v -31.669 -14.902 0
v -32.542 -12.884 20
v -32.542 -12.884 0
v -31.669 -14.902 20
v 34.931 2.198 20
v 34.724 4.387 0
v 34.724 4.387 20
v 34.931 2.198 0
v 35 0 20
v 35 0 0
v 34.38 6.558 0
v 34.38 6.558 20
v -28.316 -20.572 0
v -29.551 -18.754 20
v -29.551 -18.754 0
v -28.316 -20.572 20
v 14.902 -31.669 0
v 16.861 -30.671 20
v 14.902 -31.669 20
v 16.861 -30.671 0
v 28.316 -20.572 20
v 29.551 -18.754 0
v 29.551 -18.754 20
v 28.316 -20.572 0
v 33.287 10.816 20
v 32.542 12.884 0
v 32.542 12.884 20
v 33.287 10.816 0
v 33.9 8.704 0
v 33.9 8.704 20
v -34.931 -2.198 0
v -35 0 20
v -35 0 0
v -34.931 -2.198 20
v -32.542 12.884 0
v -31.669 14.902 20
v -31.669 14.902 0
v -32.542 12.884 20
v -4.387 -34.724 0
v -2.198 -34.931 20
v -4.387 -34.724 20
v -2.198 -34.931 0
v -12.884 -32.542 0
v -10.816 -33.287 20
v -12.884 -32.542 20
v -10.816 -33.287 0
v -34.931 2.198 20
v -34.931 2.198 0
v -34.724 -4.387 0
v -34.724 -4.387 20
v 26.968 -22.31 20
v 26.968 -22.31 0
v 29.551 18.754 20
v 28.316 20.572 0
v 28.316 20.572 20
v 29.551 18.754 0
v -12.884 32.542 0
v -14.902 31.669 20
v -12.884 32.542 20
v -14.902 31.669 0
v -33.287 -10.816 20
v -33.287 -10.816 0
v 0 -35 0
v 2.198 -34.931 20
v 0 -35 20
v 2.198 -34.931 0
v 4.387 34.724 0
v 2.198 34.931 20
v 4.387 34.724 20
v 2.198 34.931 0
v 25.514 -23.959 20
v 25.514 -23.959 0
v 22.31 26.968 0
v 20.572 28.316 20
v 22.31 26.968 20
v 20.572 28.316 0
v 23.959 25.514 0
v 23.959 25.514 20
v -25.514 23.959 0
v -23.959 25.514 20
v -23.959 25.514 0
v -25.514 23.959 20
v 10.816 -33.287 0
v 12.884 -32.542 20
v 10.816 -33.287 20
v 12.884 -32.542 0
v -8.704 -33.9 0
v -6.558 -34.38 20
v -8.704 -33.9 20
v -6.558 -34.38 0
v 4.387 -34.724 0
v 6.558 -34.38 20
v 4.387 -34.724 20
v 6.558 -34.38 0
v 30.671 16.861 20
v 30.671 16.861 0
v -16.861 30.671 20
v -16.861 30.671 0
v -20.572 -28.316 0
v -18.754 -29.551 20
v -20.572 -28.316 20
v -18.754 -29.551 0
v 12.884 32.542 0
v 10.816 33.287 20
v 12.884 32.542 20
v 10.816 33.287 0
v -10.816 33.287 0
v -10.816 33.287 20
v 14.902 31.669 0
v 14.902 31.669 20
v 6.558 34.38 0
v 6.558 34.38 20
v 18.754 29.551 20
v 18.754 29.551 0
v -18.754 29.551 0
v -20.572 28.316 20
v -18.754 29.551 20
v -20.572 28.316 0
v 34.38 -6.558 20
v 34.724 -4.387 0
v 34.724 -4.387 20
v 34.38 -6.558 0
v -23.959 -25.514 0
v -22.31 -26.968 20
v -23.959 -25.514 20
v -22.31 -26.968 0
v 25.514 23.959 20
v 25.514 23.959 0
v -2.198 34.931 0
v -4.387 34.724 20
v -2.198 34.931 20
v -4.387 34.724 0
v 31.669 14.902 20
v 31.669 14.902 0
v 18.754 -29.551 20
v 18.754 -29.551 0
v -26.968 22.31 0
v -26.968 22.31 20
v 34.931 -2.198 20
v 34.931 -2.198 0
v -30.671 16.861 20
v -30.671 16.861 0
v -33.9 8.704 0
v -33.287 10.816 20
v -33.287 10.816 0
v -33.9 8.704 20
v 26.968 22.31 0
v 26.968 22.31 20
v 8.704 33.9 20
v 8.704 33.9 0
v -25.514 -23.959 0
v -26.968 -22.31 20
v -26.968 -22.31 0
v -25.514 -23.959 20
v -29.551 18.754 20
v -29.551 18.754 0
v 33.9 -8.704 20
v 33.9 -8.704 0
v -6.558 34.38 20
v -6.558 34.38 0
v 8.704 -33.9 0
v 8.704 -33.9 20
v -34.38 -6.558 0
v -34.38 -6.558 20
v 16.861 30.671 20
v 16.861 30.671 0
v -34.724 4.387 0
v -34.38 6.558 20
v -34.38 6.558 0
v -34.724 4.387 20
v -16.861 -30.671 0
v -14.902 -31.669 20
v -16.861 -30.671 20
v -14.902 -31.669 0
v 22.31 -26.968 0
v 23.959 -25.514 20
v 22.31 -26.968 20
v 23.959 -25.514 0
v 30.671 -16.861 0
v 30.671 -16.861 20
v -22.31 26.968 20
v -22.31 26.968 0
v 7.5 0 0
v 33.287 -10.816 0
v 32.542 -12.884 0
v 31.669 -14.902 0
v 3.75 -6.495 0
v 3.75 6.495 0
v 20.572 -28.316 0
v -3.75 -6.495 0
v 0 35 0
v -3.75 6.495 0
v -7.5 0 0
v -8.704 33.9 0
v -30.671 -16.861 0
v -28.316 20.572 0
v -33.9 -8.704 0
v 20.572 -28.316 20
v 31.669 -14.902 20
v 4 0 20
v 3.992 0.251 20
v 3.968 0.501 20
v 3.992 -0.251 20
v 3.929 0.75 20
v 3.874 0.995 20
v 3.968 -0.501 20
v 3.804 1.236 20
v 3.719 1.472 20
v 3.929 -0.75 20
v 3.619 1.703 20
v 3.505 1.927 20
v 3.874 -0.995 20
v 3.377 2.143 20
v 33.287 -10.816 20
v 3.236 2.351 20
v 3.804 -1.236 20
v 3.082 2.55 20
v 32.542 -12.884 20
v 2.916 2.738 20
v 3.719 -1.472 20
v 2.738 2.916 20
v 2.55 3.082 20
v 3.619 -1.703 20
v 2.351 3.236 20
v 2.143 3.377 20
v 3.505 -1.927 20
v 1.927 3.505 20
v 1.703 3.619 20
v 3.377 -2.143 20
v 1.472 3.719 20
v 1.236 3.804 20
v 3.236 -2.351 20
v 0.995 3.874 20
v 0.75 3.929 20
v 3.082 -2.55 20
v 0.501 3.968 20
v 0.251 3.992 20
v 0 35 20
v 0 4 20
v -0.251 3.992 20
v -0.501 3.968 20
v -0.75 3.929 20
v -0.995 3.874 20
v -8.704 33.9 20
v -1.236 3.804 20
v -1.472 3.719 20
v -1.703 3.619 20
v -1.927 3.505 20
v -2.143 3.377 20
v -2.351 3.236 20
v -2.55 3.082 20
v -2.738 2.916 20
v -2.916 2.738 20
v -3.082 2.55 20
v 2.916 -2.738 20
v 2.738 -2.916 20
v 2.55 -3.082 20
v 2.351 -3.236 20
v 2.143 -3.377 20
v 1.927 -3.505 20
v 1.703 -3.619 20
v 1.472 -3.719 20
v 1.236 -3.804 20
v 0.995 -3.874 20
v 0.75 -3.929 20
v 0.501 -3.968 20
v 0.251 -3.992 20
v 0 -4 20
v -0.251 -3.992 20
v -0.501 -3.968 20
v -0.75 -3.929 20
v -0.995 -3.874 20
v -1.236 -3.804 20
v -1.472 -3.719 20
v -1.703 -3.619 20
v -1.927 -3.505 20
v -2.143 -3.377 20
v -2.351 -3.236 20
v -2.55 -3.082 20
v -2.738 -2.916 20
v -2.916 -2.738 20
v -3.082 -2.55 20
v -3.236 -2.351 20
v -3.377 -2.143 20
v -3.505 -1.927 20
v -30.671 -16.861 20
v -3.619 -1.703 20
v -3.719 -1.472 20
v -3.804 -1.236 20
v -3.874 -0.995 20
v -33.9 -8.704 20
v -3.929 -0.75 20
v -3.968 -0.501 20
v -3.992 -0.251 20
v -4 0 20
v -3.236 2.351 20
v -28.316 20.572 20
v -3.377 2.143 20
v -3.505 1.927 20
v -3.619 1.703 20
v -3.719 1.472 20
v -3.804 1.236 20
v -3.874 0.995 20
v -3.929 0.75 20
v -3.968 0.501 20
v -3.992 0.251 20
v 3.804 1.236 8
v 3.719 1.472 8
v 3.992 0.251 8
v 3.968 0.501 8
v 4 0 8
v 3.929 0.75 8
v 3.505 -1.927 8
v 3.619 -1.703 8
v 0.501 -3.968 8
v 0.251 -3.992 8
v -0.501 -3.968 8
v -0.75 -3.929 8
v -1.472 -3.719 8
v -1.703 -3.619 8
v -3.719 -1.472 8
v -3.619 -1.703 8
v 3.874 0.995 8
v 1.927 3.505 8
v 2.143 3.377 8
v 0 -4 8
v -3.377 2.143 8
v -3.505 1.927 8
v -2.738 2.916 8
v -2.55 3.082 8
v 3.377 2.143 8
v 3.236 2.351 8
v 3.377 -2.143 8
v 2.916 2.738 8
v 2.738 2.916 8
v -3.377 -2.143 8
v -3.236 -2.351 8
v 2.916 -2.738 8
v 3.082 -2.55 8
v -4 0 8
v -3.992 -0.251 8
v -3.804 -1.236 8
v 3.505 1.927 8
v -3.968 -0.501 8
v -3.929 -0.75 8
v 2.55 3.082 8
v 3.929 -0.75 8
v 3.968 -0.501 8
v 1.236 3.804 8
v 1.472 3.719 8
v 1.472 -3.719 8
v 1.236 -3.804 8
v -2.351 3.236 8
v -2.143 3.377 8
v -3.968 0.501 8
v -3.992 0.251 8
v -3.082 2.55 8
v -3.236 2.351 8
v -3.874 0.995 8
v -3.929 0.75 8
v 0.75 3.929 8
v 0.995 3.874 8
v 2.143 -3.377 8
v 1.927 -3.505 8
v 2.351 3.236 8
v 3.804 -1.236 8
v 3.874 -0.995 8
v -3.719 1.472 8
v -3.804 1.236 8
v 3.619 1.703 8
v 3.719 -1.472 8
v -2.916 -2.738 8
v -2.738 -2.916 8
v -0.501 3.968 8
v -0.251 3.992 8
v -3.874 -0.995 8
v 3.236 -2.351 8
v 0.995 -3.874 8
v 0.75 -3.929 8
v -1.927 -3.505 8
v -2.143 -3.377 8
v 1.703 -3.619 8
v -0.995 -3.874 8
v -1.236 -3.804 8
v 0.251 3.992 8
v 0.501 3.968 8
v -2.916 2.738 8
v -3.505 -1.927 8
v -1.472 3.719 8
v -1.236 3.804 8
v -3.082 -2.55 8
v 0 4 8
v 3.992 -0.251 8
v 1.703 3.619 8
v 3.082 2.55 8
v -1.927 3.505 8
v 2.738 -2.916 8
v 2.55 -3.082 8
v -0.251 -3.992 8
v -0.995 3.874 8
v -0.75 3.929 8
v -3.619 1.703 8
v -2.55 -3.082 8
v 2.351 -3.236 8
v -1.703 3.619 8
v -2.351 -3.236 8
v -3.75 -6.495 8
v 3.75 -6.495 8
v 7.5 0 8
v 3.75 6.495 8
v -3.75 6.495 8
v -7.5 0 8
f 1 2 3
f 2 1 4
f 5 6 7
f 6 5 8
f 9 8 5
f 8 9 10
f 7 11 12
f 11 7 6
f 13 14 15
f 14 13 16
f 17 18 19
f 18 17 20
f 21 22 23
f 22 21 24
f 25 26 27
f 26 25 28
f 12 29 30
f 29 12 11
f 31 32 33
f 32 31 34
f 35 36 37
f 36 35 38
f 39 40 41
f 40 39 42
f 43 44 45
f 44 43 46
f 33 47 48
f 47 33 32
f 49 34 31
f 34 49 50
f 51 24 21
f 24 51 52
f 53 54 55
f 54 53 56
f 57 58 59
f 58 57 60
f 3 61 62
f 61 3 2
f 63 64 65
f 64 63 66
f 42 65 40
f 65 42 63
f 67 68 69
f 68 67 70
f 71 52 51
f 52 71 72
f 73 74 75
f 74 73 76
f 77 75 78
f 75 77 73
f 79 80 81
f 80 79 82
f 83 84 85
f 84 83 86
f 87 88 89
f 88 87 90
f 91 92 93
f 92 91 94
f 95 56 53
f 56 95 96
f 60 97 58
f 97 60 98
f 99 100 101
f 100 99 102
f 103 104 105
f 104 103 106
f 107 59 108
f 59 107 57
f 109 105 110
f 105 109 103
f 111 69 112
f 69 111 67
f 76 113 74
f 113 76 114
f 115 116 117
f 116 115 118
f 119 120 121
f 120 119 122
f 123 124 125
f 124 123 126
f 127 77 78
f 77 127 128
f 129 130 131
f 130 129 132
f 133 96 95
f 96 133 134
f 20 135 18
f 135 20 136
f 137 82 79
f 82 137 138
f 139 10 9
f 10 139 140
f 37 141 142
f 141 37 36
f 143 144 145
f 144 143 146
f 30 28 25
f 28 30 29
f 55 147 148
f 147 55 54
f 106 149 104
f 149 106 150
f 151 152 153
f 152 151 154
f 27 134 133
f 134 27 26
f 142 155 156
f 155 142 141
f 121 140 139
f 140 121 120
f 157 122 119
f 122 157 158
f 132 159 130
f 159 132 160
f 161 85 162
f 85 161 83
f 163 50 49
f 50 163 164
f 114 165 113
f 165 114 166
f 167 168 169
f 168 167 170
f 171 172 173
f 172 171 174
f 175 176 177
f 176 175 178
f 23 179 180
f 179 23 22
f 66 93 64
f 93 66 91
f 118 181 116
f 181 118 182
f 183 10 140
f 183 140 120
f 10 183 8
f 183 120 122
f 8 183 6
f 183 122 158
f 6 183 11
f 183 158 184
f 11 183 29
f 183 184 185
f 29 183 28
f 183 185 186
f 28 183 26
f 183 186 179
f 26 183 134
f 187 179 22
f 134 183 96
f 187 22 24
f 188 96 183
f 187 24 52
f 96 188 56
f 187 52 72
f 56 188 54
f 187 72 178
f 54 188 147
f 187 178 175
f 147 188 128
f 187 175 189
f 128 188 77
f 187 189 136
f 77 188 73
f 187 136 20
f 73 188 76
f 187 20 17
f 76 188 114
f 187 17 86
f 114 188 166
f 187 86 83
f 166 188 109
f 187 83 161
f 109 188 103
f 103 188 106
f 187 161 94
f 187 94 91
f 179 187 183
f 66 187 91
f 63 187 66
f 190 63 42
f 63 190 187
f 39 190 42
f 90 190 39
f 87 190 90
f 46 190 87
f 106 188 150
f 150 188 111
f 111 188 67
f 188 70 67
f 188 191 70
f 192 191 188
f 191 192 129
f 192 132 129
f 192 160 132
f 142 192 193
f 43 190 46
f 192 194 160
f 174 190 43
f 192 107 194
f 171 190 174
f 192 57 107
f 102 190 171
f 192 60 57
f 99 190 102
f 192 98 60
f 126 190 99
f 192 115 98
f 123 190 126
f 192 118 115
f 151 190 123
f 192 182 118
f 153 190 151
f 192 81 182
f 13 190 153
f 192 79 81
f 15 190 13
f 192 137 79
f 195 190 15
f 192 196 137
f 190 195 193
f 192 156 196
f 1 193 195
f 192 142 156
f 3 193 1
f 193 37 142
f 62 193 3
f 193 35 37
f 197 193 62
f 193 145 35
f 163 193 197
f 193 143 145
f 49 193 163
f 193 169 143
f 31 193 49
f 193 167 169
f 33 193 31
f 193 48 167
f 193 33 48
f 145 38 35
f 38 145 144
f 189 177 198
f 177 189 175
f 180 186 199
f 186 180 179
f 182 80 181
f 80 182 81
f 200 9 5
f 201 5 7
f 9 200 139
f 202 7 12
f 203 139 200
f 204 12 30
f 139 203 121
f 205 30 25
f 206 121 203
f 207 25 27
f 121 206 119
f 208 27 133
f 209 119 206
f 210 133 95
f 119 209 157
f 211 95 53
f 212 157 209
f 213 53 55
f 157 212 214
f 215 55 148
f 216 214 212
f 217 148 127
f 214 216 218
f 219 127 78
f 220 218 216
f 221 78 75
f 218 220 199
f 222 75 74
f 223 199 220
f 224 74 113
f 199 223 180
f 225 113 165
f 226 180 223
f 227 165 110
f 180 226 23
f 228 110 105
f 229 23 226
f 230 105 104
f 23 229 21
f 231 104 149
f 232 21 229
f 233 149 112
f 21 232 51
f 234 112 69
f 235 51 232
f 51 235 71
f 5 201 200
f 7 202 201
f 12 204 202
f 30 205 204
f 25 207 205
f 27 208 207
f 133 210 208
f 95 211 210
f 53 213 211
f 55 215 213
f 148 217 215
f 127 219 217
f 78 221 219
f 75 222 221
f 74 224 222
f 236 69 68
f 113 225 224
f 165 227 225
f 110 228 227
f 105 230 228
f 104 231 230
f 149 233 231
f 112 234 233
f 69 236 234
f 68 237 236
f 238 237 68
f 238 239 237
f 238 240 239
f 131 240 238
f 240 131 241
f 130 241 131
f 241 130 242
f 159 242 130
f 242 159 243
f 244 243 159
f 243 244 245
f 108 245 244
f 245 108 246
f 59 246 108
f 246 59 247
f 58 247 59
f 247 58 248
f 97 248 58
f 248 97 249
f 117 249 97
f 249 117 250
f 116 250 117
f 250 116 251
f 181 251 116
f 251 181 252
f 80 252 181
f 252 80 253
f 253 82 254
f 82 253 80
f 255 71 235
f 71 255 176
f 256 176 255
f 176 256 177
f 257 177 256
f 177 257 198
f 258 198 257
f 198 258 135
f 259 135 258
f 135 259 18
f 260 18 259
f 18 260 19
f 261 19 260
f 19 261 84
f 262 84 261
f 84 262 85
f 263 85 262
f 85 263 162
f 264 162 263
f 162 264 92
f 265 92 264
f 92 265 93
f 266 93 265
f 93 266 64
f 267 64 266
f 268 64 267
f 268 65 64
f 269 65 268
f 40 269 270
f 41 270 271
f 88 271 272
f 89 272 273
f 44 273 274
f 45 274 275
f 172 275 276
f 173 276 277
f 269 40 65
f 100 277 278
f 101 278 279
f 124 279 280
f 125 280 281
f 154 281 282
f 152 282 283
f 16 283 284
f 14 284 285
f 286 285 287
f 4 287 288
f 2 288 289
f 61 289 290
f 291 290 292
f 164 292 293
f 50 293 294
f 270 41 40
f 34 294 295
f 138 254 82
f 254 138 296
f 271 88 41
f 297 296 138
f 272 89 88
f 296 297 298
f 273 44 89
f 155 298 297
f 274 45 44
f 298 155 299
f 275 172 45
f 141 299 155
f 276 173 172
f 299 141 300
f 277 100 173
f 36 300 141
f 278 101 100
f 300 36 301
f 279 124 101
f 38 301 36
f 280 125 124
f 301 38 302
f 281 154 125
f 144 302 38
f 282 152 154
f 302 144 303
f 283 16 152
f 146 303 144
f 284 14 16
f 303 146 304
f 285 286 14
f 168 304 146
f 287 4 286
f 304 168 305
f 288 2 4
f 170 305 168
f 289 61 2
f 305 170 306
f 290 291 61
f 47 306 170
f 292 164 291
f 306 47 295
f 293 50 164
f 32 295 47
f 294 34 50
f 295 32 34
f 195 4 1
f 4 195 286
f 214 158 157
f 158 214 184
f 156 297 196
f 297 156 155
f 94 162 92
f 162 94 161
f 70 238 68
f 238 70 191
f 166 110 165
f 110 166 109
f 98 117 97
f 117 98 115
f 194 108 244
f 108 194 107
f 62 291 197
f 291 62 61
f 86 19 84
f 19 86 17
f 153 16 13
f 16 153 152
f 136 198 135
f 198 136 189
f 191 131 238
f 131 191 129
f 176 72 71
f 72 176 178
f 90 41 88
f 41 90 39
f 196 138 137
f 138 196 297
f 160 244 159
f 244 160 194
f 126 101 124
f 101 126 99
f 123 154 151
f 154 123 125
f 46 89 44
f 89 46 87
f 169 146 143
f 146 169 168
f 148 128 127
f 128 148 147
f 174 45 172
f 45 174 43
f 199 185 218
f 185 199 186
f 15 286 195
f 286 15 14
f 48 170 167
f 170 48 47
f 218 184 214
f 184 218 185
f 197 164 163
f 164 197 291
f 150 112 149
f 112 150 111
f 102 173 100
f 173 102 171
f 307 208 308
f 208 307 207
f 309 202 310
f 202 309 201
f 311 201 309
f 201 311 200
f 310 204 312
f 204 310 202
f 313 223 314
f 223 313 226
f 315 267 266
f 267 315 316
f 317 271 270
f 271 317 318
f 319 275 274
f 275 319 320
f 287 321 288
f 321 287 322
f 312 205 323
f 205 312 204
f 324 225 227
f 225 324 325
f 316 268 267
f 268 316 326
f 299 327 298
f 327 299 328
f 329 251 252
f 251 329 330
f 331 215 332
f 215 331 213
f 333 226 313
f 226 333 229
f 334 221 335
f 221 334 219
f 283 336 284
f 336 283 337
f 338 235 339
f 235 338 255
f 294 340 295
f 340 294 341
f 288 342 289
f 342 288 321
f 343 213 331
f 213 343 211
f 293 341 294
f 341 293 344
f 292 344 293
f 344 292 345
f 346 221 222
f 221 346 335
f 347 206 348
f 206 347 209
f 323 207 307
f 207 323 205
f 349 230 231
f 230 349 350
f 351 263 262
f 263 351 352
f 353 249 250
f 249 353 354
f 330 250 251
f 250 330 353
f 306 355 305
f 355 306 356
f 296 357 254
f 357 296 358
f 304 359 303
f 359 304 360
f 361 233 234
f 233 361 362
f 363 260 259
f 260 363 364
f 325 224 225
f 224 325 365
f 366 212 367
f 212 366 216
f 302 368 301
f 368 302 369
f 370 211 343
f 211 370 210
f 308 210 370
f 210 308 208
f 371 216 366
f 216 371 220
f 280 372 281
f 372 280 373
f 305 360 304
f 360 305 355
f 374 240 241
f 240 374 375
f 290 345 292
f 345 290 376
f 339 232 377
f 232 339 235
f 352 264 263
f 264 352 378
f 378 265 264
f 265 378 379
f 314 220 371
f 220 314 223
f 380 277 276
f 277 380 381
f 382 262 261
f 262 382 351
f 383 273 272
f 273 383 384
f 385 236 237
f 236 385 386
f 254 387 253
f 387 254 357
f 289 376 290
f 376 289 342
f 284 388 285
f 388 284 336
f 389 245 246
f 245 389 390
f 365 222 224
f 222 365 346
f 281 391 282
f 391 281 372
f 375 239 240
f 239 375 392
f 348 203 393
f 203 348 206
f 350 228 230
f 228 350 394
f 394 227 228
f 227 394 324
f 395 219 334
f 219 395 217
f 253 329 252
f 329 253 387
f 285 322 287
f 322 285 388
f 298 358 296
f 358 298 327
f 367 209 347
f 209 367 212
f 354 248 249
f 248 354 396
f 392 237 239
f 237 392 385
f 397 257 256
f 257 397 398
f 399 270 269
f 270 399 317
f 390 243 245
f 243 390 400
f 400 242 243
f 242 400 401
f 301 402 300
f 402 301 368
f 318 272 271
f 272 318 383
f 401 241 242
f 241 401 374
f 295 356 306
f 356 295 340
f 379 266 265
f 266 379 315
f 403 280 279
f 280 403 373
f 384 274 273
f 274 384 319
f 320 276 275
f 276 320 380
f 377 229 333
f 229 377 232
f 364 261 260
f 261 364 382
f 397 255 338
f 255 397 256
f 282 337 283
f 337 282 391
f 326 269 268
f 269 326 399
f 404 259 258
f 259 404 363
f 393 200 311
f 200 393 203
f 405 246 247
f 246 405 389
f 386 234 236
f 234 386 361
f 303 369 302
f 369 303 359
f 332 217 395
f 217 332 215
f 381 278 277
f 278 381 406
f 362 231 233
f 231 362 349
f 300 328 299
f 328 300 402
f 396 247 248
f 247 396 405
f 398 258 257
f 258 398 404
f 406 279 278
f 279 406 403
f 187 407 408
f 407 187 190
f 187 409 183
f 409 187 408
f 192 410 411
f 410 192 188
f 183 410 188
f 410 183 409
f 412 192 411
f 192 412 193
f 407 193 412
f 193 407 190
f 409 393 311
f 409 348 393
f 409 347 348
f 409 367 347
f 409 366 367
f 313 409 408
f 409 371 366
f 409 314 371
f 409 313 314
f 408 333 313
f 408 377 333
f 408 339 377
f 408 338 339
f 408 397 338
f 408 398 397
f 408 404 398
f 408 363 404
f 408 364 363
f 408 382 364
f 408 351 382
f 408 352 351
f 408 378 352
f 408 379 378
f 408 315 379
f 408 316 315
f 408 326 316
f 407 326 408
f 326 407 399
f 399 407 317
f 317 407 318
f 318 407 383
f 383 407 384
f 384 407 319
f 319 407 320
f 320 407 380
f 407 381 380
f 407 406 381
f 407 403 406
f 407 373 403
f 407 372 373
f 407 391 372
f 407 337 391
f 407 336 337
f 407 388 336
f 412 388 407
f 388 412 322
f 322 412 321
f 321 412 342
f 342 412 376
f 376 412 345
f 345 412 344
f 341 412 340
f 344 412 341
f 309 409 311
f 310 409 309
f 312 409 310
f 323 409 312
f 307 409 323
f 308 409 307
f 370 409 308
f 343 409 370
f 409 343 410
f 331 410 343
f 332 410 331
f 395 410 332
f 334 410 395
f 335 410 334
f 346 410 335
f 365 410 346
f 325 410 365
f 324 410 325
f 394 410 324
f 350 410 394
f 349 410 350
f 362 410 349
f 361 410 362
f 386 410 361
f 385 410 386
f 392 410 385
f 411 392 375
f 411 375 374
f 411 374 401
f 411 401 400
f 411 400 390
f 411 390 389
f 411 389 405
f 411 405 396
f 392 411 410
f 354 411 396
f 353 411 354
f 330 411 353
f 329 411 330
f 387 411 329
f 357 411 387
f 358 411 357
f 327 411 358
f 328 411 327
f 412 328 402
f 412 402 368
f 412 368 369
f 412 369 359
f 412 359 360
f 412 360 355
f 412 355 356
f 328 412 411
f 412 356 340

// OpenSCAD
/*

Cardboard tube center for making cat trees
@idnorton
2022-07-24

Licenced as Creative Commons Attribution Non Commercial 3.0
See https://creativecommons.org/licenses/by-nc/3.0/

Specifically you may not sell the design or products using the design.
You're welcome to use the design to build things for your own commercial environment

*/

// Cardboard tube center
tube_insert_d = 70;
tube_insert_h = 20;

// Bolt dimensions
bolt_diameter = 8;
bolt_head = 15;


difference() {
    // Main body of insert
    cylinder(tube_insert_h, d=tube_insert_d, $fn=100);

    // Hole through the middle
    cylinder(tube_insert_h, d=bolt_diameter, $fn=100);

    // Bolt head clearance
    cylinder(bolt_diameter, bolt_head/2, bolt_head/2, $fn=6);
}
